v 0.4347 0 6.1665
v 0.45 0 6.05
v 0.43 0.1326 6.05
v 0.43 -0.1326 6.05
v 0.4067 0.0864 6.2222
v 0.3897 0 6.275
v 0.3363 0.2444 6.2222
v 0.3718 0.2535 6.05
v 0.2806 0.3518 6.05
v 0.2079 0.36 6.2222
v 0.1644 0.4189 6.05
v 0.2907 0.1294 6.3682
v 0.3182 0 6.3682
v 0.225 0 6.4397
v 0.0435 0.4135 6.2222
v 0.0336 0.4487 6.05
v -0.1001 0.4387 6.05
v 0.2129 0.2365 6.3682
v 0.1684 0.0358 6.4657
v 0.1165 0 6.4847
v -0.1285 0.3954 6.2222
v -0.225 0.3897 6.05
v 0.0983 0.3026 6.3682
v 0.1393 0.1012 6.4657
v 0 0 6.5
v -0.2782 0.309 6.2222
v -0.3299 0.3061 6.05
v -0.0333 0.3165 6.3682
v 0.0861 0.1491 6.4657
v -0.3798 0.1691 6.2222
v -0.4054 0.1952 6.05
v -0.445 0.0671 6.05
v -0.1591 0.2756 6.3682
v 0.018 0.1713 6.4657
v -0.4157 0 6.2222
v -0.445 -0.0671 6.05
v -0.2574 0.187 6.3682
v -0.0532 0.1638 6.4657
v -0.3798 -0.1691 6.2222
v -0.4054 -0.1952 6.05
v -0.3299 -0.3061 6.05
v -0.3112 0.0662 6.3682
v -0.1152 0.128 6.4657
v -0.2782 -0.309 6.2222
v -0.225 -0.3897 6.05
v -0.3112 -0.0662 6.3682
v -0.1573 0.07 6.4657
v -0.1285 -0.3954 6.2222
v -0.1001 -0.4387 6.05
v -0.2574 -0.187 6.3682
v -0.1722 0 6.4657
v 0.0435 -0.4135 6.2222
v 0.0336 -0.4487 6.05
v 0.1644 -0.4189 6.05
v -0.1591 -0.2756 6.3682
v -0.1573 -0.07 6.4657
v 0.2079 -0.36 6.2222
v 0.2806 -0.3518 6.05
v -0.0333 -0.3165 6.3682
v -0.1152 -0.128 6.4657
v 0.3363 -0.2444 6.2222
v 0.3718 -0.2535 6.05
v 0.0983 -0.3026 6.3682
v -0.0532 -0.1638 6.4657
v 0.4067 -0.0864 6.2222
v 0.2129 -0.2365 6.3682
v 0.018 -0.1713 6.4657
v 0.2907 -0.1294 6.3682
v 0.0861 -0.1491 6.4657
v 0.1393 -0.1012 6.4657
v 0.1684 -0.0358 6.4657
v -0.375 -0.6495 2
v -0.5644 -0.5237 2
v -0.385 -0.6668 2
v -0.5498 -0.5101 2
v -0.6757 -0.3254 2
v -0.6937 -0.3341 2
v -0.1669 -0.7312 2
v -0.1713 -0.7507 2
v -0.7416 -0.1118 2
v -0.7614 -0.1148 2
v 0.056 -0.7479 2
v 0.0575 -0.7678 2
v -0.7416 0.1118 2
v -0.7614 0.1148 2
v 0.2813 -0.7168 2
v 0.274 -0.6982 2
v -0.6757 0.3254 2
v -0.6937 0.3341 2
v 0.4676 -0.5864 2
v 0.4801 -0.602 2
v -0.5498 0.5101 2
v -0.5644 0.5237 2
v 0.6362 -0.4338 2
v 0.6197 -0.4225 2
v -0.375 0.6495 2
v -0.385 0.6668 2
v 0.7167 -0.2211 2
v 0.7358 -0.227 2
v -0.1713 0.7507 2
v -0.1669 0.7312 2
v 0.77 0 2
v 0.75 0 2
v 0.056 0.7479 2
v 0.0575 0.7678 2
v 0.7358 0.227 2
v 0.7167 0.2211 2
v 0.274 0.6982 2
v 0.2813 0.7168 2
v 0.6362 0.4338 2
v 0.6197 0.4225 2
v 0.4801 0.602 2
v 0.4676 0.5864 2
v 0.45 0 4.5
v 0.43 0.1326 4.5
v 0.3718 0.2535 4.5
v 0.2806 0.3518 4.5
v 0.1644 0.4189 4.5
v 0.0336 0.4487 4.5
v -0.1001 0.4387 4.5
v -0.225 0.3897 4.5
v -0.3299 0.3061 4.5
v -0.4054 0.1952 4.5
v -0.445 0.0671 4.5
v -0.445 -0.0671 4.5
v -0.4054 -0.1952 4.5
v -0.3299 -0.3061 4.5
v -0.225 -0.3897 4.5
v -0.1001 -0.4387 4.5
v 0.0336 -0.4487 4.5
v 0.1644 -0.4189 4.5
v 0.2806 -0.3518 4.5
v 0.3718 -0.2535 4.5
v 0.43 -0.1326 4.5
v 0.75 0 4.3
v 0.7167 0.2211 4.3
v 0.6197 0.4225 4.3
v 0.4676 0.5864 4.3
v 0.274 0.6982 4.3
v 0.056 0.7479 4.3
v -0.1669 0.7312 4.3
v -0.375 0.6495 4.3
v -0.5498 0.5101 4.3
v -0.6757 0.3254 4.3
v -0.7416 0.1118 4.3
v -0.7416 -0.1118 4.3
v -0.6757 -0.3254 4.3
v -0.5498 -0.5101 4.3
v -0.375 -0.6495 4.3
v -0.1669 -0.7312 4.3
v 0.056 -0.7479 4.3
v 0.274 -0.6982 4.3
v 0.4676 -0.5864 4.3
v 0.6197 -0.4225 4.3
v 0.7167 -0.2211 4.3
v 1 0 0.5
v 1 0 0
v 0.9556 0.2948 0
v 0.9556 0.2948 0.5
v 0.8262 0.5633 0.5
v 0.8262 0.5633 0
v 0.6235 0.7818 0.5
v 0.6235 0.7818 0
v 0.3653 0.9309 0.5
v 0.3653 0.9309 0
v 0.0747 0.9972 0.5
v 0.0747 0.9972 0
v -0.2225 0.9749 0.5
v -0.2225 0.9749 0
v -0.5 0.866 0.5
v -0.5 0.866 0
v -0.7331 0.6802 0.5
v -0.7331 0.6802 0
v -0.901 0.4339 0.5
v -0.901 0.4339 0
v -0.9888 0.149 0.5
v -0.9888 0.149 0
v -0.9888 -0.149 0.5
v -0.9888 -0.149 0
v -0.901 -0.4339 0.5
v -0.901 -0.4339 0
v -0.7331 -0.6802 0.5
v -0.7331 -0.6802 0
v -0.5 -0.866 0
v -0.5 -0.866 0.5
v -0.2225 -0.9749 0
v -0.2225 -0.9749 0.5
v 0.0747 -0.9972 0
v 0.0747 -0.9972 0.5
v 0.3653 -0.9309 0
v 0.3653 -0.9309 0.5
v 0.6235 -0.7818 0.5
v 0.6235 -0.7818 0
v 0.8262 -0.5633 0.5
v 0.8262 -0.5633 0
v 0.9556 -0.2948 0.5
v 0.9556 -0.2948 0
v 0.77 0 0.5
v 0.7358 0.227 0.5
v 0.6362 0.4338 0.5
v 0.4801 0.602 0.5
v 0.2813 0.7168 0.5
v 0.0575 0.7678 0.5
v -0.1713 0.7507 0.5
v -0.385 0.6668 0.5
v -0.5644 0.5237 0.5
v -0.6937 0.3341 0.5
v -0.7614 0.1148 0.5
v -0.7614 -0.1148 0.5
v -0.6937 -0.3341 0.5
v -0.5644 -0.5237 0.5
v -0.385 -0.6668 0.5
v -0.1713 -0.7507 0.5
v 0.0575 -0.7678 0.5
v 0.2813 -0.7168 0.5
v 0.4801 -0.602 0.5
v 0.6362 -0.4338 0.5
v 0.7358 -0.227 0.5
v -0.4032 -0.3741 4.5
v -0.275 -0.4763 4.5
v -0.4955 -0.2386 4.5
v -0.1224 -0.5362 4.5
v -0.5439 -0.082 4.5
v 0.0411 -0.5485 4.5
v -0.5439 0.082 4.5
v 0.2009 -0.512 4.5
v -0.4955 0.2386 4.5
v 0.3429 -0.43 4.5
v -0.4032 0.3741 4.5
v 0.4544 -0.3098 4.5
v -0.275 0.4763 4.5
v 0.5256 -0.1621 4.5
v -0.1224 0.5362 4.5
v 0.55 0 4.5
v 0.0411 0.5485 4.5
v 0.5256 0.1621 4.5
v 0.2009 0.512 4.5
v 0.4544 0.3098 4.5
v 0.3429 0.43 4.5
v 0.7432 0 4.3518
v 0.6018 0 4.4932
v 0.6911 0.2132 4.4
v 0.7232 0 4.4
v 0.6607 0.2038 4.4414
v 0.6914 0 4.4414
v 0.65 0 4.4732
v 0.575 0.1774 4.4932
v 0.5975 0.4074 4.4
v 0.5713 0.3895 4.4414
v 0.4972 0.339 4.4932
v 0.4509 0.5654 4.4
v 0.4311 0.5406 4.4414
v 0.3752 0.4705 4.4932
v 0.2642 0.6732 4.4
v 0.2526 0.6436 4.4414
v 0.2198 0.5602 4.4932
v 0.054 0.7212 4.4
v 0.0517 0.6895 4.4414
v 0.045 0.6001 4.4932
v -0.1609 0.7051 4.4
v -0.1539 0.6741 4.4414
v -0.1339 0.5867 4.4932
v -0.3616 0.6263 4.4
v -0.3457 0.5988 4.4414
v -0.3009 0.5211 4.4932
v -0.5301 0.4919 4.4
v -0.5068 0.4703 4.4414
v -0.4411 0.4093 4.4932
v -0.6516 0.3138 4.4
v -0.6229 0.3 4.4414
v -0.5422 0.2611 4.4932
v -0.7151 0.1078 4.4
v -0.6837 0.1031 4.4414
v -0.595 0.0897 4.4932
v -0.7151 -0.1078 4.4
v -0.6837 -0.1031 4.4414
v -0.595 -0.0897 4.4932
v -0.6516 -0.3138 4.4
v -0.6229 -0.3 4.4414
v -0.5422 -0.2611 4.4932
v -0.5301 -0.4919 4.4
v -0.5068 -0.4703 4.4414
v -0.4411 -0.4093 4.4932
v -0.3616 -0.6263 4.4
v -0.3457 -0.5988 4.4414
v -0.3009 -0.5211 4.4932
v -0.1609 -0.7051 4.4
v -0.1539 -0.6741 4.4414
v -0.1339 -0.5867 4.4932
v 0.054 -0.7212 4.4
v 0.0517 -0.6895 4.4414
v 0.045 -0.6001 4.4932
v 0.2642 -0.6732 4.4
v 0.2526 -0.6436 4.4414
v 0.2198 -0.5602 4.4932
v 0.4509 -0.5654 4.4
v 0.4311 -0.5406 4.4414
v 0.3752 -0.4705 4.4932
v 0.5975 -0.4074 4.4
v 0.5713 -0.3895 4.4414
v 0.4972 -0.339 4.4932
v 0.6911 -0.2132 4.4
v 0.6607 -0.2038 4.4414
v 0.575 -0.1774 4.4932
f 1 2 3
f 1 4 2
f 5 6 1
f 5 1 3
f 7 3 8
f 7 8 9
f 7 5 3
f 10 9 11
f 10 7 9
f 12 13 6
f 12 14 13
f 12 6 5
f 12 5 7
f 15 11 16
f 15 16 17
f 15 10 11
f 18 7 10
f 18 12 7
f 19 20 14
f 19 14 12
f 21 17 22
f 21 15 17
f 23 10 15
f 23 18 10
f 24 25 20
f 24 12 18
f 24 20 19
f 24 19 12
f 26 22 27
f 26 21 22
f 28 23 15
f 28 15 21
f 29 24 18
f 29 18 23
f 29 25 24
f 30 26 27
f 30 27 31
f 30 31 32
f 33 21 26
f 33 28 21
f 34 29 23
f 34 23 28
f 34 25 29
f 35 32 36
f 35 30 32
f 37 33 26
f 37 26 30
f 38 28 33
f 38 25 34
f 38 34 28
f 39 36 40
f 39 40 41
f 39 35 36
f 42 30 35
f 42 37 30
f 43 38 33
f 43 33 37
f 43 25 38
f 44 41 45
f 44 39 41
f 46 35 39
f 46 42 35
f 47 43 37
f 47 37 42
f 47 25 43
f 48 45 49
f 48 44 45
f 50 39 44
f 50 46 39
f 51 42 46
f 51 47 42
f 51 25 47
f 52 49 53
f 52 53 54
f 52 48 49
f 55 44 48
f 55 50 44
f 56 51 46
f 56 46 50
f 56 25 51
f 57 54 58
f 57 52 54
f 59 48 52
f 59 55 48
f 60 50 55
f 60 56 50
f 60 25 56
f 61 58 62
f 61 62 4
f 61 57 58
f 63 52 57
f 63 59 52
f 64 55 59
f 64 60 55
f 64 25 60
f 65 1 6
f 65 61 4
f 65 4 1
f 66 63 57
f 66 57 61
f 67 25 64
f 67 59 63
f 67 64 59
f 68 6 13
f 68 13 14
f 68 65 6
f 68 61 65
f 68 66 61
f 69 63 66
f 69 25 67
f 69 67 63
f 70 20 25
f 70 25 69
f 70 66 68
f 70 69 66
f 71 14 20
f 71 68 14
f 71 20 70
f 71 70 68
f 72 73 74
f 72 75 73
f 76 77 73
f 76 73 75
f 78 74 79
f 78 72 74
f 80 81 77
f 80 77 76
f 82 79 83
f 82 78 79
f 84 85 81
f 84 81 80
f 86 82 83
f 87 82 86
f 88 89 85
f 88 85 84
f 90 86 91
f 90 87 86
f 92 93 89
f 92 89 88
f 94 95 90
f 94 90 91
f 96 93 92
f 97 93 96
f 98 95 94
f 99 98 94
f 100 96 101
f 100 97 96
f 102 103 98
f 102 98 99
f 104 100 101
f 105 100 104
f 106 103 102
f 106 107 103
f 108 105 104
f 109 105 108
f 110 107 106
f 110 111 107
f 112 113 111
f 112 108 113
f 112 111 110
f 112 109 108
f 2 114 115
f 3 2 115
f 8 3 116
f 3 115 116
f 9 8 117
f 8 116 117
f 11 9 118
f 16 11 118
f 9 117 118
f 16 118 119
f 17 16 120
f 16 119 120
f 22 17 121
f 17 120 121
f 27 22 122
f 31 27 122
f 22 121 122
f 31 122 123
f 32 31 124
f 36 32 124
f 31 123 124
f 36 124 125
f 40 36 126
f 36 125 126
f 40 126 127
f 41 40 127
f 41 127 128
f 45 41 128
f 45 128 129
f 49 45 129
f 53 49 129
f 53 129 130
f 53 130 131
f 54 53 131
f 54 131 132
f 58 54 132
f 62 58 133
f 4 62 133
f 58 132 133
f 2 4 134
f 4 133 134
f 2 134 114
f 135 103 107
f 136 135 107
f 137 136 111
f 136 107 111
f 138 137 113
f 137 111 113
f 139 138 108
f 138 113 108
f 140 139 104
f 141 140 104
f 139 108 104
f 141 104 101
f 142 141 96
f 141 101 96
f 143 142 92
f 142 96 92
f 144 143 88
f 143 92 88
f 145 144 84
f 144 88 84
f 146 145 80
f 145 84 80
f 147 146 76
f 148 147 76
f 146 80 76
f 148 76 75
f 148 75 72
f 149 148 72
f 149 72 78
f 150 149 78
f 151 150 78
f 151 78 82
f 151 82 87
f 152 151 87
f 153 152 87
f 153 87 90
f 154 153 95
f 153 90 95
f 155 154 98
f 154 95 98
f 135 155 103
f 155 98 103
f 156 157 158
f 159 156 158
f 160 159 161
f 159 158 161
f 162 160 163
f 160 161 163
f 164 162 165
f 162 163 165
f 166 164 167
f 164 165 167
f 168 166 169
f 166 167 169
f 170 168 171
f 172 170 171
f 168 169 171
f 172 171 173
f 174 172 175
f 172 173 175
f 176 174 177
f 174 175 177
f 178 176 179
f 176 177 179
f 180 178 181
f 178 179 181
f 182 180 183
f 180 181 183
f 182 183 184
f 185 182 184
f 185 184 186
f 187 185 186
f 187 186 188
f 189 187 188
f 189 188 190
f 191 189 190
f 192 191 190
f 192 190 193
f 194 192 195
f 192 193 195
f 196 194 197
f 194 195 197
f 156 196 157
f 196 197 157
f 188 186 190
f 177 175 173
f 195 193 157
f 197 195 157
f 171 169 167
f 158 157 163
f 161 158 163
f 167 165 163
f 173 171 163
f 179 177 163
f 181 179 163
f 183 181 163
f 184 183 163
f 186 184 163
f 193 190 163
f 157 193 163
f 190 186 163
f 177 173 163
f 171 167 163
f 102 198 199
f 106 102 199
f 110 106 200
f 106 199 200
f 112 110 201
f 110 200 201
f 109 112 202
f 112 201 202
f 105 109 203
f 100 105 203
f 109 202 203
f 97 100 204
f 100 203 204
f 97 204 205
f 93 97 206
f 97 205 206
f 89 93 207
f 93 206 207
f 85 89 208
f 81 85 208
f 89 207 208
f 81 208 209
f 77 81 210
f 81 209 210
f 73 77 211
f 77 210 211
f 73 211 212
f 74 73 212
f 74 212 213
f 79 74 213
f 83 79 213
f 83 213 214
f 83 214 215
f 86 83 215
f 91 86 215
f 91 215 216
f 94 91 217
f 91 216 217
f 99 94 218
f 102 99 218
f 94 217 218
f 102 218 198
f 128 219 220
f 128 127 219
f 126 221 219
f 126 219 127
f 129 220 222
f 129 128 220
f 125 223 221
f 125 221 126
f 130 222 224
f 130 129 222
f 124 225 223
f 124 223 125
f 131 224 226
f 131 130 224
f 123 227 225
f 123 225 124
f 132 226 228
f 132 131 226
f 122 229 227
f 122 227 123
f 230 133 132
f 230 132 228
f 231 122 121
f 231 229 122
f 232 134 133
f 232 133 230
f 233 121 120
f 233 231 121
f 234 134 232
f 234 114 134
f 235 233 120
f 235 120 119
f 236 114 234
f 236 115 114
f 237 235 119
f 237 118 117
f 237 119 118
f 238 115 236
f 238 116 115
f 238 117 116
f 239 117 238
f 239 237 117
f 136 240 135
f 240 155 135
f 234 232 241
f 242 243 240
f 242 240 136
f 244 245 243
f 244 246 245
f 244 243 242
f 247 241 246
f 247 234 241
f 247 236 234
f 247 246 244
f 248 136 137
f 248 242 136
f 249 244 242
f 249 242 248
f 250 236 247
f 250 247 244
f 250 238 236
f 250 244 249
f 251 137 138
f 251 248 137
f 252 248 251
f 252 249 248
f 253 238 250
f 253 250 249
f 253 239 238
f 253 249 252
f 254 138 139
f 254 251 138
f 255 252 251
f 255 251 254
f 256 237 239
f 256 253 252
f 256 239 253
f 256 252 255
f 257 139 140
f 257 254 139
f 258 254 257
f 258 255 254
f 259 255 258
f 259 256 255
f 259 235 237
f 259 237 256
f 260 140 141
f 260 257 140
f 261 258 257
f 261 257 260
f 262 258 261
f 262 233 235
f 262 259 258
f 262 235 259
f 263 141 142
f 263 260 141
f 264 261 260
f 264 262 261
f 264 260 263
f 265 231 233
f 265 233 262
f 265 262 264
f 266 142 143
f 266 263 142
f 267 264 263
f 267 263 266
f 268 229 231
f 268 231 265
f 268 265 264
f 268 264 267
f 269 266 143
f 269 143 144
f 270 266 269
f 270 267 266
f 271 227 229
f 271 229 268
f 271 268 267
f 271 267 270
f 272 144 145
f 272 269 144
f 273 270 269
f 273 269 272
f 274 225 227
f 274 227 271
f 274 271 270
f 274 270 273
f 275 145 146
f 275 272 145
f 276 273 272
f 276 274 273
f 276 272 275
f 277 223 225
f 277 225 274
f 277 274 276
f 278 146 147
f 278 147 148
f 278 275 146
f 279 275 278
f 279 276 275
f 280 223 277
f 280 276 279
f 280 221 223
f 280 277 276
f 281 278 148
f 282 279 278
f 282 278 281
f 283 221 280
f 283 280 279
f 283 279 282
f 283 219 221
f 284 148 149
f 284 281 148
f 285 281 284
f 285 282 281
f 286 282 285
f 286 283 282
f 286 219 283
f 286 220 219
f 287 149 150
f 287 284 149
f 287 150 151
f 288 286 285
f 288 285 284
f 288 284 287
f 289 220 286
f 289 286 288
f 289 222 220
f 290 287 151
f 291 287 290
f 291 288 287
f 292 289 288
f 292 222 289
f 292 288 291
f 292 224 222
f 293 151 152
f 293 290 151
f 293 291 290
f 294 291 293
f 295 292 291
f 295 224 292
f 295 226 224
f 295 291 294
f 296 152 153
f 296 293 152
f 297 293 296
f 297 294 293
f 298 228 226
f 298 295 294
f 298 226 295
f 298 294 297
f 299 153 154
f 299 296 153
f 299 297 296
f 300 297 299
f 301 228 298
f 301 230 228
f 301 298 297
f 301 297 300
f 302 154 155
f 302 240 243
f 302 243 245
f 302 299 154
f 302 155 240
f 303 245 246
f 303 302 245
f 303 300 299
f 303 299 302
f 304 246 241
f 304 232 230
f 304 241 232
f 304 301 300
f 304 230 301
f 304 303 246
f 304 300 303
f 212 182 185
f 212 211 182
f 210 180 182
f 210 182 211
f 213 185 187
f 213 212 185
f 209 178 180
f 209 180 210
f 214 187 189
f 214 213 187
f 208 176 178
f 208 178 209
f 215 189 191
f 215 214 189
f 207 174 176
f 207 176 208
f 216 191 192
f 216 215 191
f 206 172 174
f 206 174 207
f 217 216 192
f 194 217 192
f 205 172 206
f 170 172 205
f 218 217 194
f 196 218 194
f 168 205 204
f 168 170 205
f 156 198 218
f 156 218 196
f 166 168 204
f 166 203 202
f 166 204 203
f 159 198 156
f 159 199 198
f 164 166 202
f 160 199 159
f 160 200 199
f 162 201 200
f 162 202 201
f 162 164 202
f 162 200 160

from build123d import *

# Parameters (mm, degrees)
SKETCH_R     = 1
PAD_DEPTH    = 0.5
SKETCH002_R  = 0.77
PAD001_DEPTH = 1.5
SKETCH003_R  = 0.75
PAD002_DEPTH = 2.5
FILLET_R     = 0.2
SKETCH004_R  = 0.45
PAD003_DEPTH = 2
FILLET001_R  = 0.45


with BuildPart() as part:
    # Sketch → Pad (new body)
    with BuildSketch(Plane.XY):
        Circle(SKETCH_R)
    extrude(amount=PAD_DEPTH)

    # Sketch002 (on Face3 of Pad) → Pad001 (join)
    with BuildSketch(Plane.XY.offset(0.5)):
        Circle(SKETCH002_R)
    extrude(amount=PAD001_DEPTH)

    # Sketch003 (on Face5 of Pad001) → Pad002 (join)
    with BuildSketch(Plane.XY.offset(2)):
        Circle(SKETCH003_R)
    extrude(amount=PAD002_DEPTH)

    # Fillet
    fillet_edges = [part.edges().sort_by_distance(p)[0] for p in [
        (-0.75, 0, 4.5),
    ]]
    fillet(fillet_edges, radius=FILLET_R)

    # Sketch004 (on Face4 of Fillet) → Pad003 (join)
    with BuildSketch(Plane.XY.offset(4.5)):
        Circle(SKETCH004_R)
    extrude(amount=PAD003_DEPTH)

    # Fillet001
    fillet001_edges = [part.edges().sort_by_distance(p)[0] for p in [
        (-0.45, 0, 6.5),
    ]]
    fillet(fillet001_edges, radius=FILLET001_R)


solid = part.part
